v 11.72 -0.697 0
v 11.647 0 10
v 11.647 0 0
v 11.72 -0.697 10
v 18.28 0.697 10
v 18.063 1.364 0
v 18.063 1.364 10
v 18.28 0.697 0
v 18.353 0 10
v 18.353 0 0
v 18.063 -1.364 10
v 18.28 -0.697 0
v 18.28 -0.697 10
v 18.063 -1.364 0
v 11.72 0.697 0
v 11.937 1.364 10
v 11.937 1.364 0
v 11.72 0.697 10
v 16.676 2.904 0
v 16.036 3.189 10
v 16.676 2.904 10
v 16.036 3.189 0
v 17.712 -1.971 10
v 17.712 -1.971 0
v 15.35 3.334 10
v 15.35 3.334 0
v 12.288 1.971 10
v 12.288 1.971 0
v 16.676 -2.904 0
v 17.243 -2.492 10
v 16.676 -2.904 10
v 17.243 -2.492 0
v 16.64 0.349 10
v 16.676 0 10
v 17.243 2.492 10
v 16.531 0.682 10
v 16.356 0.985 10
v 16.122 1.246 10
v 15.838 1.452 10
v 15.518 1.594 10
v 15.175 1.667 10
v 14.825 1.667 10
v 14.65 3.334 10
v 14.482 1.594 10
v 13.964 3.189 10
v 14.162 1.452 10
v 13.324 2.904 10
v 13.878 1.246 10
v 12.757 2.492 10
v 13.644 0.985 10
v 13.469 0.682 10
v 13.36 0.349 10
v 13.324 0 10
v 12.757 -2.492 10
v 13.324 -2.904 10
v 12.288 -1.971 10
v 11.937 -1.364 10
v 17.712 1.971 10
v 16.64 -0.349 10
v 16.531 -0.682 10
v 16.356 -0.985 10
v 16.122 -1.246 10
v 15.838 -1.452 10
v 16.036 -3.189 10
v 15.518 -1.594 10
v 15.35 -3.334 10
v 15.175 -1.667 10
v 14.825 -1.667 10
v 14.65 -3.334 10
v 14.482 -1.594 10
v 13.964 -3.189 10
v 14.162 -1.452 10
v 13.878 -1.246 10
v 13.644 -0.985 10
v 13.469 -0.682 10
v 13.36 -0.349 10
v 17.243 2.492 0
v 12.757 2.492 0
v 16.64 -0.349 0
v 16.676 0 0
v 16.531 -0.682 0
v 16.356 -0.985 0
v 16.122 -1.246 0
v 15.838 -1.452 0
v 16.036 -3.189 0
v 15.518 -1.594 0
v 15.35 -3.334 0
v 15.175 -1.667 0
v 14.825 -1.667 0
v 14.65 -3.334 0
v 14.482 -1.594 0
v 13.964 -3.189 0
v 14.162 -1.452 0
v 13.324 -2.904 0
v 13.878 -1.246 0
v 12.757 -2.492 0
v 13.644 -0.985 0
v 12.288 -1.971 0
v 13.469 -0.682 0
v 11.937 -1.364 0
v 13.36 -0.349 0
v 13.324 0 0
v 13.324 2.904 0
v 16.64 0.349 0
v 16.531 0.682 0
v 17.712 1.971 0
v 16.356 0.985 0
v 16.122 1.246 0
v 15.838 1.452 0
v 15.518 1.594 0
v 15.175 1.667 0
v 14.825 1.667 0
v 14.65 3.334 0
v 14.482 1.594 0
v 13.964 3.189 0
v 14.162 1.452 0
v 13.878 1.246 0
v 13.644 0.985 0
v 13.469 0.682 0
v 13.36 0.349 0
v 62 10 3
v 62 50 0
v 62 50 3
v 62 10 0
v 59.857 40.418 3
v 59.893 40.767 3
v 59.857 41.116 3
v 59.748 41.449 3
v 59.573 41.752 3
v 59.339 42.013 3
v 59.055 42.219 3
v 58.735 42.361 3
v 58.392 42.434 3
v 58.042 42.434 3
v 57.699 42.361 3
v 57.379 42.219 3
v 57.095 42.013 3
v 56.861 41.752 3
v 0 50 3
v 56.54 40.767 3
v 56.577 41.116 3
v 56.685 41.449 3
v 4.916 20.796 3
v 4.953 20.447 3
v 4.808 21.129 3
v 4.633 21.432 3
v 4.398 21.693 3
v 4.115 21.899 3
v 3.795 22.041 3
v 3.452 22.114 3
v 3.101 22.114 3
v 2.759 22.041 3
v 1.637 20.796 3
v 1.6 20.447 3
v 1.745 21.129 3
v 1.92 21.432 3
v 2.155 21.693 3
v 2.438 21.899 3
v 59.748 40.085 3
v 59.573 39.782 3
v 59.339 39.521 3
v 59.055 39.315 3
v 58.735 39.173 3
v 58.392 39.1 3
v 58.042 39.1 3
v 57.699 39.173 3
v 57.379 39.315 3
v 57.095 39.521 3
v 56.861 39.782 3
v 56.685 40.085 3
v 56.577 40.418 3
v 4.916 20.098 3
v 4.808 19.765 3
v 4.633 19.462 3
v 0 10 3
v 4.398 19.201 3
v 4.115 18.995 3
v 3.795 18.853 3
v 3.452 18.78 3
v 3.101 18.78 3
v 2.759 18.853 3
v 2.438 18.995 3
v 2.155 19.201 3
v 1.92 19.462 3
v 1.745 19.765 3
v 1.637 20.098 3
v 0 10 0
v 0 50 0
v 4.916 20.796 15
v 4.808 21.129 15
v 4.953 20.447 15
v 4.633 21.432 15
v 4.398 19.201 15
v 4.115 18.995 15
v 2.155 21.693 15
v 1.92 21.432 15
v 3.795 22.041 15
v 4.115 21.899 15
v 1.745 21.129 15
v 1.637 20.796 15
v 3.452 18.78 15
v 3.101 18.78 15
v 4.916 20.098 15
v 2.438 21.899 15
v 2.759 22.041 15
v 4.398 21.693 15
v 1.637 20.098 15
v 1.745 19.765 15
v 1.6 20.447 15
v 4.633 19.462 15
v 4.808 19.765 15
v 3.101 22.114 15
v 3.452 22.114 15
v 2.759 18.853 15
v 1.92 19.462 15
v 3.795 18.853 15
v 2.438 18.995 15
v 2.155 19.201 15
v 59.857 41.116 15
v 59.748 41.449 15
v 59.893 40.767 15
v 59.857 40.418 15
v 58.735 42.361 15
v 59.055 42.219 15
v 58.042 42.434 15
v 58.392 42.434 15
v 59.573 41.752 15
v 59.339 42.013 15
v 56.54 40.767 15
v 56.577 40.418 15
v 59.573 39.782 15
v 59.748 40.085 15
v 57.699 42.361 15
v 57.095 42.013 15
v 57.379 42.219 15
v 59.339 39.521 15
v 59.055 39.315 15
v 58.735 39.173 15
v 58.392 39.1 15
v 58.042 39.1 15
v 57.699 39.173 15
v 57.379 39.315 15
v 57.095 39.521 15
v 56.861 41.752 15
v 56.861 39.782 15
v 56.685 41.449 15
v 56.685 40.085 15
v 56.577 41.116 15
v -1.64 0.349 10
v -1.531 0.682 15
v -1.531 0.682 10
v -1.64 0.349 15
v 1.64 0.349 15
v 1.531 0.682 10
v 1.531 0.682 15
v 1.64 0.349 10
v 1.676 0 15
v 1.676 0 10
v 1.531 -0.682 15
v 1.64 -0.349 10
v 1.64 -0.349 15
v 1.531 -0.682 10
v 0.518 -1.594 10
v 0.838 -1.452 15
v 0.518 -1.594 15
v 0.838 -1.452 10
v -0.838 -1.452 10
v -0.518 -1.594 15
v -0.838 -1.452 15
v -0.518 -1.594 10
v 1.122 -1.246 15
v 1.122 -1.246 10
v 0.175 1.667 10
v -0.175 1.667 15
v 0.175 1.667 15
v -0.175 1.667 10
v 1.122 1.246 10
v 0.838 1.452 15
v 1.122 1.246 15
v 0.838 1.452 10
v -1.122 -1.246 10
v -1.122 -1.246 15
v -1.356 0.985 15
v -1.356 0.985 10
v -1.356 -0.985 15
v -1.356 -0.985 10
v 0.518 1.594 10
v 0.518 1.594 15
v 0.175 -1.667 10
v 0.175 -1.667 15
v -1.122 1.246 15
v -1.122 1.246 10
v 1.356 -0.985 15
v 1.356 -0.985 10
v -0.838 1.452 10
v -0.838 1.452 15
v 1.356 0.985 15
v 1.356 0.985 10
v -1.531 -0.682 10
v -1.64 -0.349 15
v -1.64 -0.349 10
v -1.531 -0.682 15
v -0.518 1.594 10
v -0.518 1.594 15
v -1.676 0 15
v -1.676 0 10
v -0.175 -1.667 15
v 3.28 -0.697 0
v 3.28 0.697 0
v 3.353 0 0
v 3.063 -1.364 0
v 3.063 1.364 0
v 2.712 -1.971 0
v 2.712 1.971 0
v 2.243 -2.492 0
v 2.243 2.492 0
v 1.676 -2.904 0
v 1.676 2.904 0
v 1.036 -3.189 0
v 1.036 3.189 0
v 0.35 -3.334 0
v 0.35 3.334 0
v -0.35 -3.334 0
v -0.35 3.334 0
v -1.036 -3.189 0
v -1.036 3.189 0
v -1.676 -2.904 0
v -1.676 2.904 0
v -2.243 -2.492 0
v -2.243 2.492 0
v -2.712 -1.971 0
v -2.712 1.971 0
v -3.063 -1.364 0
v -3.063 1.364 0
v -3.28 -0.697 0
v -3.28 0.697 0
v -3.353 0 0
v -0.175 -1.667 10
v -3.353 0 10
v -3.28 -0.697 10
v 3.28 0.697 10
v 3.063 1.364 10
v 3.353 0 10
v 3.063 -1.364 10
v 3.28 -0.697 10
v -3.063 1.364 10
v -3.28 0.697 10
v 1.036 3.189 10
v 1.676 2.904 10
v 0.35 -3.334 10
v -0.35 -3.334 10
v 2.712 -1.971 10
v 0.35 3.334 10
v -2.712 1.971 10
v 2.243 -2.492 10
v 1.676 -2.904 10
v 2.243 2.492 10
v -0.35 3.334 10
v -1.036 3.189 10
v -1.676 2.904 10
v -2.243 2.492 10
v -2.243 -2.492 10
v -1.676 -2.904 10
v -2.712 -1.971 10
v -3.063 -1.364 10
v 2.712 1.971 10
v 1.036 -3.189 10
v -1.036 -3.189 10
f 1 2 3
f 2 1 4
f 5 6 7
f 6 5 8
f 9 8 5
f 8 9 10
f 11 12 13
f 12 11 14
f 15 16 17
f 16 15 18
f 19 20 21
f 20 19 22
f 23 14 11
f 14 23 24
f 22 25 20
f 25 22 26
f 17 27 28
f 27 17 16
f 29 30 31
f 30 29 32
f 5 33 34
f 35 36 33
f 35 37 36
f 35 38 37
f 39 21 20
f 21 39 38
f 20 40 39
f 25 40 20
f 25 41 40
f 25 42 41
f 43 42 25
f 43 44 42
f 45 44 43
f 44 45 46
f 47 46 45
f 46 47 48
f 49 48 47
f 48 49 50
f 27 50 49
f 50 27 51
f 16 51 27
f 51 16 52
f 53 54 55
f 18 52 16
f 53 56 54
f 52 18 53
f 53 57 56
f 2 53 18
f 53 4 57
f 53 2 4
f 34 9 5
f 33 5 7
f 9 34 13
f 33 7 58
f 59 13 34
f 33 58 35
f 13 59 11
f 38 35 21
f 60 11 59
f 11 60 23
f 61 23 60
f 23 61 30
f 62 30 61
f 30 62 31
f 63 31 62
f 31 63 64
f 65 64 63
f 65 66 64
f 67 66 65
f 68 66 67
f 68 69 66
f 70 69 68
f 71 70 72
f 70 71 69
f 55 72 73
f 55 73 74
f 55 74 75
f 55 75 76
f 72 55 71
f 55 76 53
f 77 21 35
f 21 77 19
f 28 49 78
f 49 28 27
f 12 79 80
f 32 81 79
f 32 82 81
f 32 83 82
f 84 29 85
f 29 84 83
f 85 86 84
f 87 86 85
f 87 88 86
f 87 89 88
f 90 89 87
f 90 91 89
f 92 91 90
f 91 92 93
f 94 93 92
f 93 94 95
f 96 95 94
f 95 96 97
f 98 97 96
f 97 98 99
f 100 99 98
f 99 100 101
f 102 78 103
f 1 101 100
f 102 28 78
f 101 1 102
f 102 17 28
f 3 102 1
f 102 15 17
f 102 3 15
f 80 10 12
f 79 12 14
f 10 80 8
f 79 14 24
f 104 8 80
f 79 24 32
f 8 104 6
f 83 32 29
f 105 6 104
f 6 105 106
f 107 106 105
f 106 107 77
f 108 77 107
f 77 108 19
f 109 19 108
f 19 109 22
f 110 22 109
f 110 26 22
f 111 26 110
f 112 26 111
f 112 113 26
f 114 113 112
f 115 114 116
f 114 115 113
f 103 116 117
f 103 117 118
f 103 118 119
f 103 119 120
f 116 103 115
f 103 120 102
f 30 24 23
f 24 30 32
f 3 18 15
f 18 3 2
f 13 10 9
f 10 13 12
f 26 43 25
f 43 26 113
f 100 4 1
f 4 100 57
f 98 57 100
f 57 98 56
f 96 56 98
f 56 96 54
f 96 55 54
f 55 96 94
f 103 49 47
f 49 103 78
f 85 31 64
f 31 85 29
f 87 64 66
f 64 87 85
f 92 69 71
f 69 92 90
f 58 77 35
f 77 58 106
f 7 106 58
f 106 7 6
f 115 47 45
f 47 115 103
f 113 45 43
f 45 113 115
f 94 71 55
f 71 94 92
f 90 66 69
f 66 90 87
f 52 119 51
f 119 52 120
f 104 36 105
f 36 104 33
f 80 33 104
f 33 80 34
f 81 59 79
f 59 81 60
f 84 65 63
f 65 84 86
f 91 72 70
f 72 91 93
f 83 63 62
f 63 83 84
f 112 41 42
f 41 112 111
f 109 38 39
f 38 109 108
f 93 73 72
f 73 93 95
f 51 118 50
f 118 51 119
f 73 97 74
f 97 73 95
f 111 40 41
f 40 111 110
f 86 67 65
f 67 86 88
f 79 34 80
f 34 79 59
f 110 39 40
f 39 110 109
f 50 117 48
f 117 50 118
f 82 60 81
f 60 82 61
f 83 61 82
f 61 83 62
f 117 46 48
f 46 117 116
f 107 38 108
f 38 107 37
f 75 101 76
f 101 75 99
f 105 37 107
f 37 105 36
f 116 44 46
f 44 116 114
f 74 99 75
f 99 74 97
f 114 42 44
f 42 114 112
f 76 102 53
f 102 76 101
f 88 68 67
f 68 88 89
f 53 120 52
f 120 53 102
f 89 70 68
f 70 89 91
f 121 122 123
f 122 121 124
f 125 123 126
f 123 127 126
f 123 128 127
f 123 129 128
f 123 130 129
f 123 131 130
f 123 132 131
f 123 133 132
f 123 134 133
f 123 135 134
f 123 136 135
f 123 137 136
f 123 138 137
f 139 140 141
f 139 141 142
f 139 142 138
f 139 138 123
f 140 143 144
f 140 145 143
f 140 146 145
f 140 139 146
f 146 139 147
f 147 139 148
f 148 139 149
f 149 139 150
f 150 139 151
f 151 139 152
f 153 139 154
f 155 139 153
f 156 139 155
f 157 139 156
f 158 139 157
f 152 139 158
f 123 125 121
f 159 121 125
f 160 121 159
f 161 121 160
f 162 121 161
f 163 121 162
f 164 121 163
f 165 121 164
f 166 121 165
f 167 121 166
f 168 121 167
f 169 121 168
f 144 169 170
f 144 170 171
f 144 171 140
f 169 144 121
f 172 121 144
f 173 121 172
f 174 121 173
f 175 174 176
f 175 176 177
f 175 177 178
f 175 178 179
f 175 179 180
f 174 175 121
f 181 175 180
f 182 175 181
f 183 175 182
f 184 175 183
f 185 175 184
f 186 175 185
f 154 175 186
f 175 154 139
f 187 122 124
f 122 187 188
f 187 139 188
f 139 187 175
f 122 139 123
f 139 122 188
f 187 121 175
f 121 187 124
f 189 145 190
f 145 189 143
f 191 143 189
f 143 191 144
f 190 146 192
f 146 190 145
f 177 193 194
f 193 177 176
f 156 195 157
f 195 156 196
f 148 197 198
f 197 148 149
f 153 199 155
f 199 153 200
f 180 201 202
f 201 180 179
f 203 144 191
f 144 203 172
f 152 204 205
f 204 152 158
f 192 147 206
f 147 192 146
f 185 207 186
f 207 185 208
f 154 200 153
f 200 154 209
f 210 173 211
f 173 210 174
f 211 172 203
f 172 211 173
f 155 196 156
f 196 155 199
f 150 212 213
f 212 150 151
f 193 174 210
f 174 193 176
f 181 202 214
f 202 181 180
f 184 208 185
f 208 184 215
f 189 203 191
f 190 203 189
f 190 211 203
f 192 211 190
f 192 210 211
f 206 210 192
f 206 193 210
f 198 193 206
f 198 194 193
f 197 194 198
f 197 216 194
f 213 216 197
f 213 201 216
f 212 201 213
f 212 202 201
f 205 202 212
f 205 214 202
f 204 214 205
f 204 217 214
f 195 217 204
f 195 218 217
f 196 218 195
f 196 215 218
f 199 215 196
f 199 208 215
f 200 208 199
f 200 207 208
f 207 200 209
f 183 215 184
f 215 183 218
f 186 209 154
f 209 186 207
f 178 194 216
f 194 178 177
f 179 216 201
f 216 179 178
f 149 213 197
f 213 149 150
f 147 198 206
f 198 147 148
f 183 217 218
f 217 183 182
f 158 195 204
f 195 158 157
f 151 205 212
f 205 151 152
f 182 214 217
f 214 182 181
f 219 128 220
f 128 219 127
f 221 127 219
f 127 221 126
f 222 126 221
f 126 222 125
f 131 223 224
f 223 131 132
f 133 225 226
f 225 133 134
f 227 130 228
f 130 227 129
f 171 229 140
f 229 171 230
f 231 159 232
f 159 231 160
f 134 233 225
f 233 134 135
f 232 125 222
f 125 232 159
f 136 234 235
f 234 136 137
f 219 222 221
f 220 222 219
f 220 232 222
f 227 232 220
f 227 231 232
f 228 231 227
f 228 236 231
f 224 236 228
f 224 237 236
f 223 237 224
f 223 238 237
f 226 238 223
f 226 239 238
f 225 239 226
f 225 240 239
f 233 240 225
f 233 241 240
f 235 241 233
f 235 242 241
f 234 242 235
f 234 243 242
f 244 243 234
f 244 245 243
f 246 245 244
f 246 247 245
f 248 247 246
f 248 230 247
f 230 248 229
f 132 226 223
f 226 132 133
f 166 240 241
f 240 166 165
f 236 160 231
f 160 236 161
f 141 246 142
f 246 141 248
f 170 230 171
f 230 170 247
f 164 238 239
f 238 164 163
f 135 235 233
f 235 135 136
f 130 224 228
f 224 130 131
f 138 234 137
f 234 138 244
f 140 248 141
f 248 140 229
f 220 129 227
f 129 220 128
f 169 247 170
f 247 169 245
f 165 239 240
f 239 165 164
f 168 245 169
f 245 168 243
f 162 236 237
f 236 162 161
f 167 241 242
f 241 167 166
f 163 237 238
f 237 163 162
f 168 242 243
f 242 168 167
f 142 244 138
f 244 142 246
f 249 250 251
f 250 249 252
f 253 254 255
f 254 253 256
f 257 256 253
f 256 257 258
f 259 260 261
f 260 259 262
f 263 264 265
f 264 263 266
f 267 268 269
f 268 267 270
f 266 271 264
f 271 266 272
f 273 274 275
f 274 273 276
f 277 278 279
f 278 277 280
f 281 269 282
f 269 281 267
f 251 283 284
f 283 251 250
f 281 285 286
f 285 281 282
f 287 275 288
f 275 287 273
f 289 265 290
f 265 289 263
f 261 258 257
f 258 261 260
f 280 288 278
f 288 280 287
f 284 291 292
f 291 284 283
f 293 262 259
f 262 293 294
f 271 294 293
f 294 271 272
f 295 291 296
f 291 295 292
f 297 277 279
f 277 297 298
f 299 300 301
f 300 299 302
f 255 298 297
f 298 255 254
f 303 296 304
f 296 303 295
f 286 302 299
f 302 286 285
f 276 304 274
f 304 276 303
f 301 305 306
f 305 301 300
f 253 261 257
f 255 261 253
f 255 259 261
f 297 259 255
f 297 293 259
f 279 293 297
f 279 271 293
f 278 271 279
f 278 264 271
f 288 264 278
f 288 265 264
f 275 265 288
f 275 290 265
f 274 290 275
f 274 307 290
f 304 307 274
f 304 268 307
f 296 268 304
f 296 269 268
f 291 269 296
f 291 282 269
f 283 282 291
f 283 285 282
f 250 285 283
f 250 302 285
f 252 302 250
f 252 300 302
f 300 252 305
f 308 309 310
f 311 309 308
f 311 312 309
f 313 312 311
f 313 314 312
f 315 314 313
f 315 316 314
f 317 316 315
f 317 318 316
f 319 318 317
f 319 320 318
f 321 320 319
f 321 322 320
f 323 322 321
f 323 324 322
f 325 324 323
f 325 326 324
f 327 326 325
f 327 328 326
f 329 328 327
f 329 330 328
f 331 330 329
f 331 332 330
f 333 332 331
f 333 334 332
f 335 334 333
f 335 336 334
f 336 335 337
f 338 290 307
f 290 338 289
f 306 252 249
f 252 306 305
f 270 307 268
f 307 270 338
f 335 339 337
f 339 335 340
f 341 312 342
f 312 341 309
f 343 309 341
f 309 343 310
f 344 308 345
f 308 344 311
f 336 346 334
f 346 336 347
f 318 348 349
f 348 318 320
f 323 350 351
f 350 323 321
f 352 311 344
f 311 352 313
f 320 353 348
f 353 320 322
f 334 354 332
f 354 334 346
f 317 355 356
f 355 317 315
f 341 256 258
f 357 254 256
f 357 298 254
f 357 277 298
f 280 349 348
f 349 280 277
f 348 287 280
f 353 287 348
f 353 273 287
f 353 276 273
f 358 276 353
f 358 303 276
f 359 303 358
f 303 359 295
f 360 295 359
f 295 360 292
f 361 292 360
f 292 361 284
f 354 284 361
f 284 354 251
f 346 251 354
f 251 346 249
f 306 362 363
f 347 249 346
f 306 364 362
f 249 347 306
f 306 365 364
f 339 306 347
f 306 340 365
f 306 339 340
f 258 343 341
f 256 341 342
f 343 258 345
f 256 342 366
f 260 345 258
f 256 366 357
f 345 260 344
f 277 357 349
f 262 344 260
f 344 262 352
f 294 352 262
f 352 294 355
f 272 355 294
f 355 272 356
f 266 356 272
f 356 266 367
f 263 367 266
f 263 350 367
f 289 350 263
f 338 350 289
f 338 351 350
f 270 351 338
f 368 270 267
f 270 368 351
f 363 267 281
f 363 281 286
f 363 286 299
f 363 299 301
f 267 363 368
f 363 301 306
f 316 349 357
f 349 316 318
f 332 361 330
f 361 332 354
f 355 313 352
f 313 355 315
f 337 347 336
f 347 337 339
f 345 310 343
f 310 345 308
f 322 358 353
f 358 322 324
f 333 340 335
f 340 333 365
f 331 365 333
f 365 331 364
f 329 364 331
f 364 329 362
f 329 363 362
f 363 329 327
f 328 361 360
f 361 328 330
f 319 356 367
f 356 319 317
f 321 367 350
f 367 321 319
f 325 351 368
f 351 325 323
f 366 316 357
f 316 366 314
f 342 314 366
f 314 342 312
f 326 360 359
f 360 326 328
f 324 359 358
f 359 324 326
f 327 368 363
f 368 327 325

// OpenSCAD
$fn = 30;
thou2mm = 0.0254;
translate([0,10]) cube([62,40,3]);
// probably radius should be 180
translate([129*thou2mm,805*thou2mm]) scale([thou2mm,thou2mm,1])cylinder(h=15, r1=132/2, r2=132/2); 



translate([2292*thou2mm,1605*thou2mm]) scale([thou2mm,thou2mm,1])cylinder(h=15, r1=132/2, r2=132/2); 

scale([thou2mm,thou2mm,1])cylinder(h=15, r1=132/2, r2=132/2); 

scale([thou2mm,thou2mm,1])cylinder(h=10, r1=132, r2=132); 
difference() {
    translate([15,0]) scale([thou2mm,thou2mm,1])cylinder(h=10, r1=132, r2=132); 
    
translate([15,0]) scale([thou2mm,thou2mm,1])cylinder(h=15, r1=132/2, r2=132/2); 


}
 
